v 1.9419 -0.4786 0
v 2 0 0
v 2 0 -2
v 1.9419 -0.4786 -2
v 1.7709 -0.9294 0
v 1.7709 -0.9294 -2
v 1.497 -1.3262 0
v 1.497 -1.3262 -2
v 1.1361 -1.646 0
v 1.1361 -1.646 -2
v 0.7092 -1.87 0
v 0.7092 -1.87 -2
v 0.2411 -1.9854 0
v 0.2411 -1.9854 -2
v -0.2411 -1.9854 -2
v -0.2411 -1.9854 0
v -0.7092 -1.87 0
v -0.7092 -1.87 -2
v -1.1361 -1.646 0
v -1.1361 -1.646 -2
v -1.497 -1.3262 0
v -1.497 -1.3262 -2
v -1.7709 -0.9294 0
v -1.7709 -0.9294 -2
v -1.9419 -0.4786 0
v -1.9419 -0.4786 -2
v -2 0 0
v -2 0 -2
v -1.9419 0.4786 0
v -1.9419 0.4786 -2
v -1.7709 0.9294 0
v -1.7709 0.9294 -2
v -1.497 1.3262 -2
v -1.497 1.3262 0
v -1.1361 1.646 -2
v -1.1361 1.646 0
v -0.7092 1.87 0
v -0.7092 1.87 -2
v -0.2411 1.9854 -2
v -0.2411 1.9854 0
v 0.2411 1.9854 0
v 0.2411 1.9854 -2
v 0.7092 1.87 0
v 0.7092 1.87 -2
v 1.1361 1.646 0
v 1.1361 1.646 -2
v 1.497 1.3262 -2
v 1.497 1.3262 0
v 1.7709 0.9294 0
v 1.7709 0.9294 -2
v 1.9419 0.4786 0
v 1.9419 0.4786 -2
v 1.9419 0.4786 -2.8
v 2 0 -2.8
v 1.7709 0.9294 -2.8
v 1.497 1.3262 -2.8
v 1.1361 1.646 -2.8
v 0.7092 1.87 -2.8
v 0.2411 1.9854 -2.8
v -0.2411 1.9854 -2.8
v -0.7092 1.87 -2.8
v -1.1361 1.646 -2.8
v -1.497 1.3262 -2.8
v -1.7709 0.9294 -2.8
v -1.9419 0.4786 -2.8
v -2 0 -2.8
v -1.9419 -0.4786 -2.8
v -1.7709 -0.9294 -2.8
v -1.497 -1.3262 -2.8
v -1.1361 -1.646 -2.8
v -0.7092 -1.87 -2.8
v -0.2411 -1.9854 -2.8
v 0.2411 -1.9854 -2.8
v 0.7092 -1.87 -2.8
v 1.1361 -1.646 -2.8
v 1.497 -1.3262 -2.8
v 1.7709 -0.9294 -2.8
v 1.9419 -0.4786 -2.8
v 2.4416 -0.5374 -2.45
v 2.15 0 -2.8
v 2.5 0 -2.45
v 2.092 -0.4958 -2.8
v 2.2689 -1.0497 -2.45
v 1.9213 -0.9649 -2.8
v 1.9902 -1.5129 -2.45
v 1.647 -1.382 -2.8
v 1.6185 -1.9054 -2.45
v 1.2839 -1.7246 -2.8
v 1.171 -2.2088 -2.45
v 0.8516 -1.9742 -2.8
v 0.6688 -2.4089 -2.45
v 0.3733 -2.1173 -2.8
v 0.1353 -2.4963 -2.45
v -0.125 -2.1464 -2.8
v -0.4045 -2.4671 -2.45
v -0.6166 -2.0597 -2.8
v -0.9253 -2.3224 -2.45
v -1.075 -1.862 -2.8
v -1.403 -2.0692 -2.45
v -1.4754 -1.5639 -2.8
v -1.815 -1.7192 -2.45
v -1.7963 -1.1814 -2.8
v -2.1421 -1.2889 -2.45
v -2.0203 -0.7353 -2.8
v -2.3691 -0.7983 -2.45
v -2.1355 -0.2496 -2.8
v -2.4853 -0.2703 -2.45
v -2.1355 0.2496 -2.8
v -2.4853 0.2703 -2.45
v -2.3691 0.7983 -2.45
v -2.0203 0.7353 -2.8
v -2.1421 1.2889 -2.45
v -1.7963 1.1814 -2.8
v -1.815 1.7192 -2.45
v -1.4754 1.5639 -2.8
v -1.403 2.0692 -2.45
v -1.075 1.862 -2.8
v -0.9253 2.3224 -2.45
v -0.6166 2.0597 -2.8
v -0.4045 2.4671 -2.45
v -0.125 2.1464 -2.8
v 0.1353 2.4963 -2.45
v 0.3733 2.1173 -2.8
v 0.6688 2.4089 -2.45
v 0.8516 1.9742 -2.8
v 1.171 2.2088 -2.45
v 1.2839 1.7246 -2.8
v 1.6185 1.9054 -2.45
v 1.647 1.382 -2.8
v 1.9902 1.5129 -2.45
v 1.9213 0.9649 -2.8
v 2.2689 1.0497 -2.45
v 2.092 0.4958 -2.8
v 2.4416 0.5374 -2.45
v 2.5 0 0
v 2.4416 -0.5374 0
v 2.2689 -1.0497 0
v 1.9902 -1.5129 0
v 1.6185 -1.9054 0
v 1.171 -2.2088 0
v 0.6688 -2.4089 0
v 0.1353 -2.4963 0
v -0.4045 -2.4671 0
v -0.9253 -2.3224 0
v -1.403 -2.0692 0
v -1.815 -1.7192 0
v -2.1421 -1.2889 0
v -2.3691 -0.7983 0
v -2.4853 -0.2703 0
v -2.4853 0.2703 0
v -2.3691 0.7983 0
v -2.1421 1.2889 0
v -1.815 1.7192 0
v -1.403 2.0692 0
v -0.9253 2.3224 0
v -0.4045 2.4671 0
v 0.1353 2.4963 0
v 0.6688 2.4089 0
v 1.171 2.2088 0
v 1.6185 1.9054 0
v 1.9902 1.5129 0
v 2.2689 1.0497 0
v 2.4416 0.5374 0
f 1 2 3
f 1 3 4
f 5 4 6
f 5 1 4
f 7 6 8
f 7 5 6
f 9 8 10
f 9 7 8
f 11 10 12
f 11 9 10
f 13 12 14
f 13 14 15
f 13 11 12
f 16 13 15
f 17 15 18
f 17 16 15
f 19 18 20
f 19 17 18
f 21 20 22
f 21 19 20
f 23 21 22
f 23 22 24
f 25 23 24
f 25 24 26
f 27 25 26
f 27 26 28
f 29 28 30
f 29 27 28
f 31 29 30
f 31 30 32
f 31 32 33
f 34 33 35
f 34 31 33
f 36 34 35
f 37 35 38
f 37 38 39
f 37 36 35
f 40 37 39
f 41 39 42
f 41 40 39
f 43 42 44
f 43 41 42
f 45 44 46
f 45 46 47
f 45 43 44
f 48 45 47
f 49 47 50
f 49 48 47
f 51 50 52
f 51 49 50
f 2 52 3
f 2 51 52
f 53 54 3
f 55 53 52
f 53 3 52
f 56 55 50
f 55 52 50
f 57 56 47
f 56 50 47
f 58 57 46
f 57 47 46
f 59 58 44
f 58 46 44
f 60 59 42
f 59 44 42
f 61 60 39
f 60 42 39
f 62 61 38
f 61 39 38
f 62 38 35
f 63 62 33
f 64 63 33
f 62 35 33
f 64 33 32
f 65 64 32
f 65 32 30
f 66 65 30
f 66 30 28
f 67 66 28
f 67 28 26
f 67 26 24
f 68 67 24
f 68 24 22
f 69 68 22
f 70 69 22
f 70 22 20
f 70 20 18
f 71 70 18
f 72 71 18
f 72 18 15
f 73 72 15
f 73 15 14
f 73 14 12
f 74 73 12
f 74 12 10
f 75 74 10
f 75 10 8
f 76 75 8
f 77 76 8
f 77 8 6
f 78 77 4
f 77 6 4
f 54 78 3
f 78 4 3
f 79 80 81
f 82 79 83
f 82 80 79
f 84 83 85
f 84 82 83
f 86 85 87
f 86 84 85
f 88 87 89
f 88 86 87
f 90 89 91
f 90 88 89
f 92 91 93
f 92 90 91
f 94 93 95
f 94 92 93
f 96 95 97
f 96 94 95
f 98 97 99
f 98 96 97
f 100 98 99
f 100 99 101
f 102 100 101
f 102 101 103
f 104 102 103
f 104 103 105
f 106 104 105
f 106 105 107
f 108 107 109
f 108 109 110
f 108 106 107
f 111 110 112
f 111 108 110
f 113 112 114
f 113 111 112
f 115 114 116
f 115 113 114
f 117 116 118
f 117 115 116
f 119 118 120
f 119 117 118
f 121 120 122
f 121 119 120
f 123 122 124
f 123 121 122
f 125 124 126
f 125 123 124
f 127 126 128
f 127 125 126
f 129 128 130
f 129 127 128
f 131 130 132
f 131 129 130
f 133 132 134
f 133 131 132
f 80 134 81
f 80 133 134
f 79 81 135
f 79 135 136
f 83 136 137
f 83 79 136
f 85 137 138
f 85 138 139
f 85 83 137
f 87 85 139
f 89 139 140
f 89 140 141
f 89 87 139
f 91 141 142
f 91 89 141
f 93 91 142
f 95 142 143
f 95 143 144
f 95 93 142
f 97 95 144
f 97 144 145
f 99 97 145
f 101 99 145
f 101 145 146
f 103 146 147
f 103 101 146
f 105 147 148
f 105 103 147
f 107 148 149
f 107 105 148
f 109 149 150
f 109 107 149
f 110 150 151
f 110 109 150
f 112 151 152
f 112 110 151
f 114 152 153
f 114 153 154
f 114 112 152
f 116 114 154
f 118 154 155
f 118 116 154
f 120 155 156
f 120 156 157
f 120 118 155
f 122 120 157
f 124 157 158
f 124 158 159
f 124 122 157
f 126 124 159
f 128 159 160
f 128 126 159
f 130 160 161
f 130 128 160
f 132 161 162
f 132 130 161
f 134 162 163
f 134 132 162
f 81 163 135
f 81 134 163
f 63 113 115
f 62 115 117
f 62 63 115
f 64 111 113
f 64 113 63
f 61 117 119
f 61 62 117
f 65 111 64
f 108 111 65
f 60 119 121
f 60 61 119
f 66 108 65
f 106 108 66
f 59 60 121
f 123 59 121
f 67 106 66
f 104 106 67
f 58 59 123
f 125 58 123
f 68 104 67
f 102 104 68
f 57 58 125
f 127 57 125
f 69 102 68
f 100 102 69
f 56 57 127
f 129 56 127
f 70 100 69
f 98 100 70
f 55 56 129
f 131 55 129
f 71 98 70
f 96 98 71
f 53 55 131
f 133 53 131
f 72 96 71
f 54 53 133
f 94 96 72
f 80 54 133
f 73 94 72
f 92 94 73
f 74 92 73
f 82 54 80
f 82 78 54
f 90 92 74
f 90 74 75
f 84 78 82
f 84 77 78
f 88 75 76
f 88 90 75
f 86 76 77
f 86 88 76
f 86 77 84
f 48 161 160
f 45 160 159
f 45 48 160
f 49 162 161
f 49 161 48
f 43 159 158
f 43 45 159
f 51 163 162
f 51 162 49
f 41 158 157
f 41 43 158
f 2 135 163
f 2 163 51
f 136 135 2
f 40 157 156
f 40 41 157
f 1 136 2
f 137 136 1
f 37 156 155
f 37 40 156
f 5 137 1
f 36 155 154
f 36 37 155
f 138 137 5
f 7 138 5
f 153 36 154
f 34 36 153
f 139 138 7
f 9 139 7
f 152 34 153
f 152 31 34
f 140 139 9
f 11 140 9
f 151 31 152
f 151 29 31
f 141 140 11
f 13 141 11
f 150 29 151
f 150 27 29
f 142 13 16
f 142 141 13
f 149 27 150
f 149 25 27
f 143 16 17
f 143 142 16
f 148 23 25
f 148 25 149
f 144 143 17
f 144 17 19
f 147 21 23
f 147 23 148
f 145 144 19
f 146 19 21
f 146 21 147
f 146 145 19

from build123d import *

# Parameters (mm, degrees)
FASE1_SIZE                      = 0.35
SKIZZE1_R                       = 2
SCHNITT_LINEAR_AUSTRAGEN1_DEPTH = 5.062019202


with BuildPart() as part:
    # Sketch1 → Revolve1 (revolve)
    with BuildSketch(Plane(origin=(0, 0, 0), x_dir=(0, 0, -1), z_dir=(1, 0, 0)), mode=Mode.PRIVATE) as revolve1_sk:
        Polygon((0, 2.5), (2.8, 2.5), (2.8, 1.5), (4, 1.5), (4, 0.5), (2, 0.5), (2, 2), (0, 2), align=None)
    revolve(revolve1_sk.sketch.rotate(Axis((0, 0, 20.700415561), (0, 0, -1)), 90), axis=Axis((0, 0, 20.700415561), (0, 0, -1)))

    # Fase1
    fase1_edges = [part.edges().sort_by_distance(p)[0] for p in [
        (-2.5, 0, -2.8),
    ]]
    chamfer(fase1_edges, length=FASE1_SIZE)

    # Skizze1 → Schnitt-Linear austragen1 (cut, through all)
    with BuildSketch(Plane.XY.offset(-2)):
        Circle(SKIZZE1_R)
    extrude(amount=-SCHNITT_LINEAR_AUSTRAGEN1_DEPTH, mode=Mode.SUBTRACT)


solid = part.part
